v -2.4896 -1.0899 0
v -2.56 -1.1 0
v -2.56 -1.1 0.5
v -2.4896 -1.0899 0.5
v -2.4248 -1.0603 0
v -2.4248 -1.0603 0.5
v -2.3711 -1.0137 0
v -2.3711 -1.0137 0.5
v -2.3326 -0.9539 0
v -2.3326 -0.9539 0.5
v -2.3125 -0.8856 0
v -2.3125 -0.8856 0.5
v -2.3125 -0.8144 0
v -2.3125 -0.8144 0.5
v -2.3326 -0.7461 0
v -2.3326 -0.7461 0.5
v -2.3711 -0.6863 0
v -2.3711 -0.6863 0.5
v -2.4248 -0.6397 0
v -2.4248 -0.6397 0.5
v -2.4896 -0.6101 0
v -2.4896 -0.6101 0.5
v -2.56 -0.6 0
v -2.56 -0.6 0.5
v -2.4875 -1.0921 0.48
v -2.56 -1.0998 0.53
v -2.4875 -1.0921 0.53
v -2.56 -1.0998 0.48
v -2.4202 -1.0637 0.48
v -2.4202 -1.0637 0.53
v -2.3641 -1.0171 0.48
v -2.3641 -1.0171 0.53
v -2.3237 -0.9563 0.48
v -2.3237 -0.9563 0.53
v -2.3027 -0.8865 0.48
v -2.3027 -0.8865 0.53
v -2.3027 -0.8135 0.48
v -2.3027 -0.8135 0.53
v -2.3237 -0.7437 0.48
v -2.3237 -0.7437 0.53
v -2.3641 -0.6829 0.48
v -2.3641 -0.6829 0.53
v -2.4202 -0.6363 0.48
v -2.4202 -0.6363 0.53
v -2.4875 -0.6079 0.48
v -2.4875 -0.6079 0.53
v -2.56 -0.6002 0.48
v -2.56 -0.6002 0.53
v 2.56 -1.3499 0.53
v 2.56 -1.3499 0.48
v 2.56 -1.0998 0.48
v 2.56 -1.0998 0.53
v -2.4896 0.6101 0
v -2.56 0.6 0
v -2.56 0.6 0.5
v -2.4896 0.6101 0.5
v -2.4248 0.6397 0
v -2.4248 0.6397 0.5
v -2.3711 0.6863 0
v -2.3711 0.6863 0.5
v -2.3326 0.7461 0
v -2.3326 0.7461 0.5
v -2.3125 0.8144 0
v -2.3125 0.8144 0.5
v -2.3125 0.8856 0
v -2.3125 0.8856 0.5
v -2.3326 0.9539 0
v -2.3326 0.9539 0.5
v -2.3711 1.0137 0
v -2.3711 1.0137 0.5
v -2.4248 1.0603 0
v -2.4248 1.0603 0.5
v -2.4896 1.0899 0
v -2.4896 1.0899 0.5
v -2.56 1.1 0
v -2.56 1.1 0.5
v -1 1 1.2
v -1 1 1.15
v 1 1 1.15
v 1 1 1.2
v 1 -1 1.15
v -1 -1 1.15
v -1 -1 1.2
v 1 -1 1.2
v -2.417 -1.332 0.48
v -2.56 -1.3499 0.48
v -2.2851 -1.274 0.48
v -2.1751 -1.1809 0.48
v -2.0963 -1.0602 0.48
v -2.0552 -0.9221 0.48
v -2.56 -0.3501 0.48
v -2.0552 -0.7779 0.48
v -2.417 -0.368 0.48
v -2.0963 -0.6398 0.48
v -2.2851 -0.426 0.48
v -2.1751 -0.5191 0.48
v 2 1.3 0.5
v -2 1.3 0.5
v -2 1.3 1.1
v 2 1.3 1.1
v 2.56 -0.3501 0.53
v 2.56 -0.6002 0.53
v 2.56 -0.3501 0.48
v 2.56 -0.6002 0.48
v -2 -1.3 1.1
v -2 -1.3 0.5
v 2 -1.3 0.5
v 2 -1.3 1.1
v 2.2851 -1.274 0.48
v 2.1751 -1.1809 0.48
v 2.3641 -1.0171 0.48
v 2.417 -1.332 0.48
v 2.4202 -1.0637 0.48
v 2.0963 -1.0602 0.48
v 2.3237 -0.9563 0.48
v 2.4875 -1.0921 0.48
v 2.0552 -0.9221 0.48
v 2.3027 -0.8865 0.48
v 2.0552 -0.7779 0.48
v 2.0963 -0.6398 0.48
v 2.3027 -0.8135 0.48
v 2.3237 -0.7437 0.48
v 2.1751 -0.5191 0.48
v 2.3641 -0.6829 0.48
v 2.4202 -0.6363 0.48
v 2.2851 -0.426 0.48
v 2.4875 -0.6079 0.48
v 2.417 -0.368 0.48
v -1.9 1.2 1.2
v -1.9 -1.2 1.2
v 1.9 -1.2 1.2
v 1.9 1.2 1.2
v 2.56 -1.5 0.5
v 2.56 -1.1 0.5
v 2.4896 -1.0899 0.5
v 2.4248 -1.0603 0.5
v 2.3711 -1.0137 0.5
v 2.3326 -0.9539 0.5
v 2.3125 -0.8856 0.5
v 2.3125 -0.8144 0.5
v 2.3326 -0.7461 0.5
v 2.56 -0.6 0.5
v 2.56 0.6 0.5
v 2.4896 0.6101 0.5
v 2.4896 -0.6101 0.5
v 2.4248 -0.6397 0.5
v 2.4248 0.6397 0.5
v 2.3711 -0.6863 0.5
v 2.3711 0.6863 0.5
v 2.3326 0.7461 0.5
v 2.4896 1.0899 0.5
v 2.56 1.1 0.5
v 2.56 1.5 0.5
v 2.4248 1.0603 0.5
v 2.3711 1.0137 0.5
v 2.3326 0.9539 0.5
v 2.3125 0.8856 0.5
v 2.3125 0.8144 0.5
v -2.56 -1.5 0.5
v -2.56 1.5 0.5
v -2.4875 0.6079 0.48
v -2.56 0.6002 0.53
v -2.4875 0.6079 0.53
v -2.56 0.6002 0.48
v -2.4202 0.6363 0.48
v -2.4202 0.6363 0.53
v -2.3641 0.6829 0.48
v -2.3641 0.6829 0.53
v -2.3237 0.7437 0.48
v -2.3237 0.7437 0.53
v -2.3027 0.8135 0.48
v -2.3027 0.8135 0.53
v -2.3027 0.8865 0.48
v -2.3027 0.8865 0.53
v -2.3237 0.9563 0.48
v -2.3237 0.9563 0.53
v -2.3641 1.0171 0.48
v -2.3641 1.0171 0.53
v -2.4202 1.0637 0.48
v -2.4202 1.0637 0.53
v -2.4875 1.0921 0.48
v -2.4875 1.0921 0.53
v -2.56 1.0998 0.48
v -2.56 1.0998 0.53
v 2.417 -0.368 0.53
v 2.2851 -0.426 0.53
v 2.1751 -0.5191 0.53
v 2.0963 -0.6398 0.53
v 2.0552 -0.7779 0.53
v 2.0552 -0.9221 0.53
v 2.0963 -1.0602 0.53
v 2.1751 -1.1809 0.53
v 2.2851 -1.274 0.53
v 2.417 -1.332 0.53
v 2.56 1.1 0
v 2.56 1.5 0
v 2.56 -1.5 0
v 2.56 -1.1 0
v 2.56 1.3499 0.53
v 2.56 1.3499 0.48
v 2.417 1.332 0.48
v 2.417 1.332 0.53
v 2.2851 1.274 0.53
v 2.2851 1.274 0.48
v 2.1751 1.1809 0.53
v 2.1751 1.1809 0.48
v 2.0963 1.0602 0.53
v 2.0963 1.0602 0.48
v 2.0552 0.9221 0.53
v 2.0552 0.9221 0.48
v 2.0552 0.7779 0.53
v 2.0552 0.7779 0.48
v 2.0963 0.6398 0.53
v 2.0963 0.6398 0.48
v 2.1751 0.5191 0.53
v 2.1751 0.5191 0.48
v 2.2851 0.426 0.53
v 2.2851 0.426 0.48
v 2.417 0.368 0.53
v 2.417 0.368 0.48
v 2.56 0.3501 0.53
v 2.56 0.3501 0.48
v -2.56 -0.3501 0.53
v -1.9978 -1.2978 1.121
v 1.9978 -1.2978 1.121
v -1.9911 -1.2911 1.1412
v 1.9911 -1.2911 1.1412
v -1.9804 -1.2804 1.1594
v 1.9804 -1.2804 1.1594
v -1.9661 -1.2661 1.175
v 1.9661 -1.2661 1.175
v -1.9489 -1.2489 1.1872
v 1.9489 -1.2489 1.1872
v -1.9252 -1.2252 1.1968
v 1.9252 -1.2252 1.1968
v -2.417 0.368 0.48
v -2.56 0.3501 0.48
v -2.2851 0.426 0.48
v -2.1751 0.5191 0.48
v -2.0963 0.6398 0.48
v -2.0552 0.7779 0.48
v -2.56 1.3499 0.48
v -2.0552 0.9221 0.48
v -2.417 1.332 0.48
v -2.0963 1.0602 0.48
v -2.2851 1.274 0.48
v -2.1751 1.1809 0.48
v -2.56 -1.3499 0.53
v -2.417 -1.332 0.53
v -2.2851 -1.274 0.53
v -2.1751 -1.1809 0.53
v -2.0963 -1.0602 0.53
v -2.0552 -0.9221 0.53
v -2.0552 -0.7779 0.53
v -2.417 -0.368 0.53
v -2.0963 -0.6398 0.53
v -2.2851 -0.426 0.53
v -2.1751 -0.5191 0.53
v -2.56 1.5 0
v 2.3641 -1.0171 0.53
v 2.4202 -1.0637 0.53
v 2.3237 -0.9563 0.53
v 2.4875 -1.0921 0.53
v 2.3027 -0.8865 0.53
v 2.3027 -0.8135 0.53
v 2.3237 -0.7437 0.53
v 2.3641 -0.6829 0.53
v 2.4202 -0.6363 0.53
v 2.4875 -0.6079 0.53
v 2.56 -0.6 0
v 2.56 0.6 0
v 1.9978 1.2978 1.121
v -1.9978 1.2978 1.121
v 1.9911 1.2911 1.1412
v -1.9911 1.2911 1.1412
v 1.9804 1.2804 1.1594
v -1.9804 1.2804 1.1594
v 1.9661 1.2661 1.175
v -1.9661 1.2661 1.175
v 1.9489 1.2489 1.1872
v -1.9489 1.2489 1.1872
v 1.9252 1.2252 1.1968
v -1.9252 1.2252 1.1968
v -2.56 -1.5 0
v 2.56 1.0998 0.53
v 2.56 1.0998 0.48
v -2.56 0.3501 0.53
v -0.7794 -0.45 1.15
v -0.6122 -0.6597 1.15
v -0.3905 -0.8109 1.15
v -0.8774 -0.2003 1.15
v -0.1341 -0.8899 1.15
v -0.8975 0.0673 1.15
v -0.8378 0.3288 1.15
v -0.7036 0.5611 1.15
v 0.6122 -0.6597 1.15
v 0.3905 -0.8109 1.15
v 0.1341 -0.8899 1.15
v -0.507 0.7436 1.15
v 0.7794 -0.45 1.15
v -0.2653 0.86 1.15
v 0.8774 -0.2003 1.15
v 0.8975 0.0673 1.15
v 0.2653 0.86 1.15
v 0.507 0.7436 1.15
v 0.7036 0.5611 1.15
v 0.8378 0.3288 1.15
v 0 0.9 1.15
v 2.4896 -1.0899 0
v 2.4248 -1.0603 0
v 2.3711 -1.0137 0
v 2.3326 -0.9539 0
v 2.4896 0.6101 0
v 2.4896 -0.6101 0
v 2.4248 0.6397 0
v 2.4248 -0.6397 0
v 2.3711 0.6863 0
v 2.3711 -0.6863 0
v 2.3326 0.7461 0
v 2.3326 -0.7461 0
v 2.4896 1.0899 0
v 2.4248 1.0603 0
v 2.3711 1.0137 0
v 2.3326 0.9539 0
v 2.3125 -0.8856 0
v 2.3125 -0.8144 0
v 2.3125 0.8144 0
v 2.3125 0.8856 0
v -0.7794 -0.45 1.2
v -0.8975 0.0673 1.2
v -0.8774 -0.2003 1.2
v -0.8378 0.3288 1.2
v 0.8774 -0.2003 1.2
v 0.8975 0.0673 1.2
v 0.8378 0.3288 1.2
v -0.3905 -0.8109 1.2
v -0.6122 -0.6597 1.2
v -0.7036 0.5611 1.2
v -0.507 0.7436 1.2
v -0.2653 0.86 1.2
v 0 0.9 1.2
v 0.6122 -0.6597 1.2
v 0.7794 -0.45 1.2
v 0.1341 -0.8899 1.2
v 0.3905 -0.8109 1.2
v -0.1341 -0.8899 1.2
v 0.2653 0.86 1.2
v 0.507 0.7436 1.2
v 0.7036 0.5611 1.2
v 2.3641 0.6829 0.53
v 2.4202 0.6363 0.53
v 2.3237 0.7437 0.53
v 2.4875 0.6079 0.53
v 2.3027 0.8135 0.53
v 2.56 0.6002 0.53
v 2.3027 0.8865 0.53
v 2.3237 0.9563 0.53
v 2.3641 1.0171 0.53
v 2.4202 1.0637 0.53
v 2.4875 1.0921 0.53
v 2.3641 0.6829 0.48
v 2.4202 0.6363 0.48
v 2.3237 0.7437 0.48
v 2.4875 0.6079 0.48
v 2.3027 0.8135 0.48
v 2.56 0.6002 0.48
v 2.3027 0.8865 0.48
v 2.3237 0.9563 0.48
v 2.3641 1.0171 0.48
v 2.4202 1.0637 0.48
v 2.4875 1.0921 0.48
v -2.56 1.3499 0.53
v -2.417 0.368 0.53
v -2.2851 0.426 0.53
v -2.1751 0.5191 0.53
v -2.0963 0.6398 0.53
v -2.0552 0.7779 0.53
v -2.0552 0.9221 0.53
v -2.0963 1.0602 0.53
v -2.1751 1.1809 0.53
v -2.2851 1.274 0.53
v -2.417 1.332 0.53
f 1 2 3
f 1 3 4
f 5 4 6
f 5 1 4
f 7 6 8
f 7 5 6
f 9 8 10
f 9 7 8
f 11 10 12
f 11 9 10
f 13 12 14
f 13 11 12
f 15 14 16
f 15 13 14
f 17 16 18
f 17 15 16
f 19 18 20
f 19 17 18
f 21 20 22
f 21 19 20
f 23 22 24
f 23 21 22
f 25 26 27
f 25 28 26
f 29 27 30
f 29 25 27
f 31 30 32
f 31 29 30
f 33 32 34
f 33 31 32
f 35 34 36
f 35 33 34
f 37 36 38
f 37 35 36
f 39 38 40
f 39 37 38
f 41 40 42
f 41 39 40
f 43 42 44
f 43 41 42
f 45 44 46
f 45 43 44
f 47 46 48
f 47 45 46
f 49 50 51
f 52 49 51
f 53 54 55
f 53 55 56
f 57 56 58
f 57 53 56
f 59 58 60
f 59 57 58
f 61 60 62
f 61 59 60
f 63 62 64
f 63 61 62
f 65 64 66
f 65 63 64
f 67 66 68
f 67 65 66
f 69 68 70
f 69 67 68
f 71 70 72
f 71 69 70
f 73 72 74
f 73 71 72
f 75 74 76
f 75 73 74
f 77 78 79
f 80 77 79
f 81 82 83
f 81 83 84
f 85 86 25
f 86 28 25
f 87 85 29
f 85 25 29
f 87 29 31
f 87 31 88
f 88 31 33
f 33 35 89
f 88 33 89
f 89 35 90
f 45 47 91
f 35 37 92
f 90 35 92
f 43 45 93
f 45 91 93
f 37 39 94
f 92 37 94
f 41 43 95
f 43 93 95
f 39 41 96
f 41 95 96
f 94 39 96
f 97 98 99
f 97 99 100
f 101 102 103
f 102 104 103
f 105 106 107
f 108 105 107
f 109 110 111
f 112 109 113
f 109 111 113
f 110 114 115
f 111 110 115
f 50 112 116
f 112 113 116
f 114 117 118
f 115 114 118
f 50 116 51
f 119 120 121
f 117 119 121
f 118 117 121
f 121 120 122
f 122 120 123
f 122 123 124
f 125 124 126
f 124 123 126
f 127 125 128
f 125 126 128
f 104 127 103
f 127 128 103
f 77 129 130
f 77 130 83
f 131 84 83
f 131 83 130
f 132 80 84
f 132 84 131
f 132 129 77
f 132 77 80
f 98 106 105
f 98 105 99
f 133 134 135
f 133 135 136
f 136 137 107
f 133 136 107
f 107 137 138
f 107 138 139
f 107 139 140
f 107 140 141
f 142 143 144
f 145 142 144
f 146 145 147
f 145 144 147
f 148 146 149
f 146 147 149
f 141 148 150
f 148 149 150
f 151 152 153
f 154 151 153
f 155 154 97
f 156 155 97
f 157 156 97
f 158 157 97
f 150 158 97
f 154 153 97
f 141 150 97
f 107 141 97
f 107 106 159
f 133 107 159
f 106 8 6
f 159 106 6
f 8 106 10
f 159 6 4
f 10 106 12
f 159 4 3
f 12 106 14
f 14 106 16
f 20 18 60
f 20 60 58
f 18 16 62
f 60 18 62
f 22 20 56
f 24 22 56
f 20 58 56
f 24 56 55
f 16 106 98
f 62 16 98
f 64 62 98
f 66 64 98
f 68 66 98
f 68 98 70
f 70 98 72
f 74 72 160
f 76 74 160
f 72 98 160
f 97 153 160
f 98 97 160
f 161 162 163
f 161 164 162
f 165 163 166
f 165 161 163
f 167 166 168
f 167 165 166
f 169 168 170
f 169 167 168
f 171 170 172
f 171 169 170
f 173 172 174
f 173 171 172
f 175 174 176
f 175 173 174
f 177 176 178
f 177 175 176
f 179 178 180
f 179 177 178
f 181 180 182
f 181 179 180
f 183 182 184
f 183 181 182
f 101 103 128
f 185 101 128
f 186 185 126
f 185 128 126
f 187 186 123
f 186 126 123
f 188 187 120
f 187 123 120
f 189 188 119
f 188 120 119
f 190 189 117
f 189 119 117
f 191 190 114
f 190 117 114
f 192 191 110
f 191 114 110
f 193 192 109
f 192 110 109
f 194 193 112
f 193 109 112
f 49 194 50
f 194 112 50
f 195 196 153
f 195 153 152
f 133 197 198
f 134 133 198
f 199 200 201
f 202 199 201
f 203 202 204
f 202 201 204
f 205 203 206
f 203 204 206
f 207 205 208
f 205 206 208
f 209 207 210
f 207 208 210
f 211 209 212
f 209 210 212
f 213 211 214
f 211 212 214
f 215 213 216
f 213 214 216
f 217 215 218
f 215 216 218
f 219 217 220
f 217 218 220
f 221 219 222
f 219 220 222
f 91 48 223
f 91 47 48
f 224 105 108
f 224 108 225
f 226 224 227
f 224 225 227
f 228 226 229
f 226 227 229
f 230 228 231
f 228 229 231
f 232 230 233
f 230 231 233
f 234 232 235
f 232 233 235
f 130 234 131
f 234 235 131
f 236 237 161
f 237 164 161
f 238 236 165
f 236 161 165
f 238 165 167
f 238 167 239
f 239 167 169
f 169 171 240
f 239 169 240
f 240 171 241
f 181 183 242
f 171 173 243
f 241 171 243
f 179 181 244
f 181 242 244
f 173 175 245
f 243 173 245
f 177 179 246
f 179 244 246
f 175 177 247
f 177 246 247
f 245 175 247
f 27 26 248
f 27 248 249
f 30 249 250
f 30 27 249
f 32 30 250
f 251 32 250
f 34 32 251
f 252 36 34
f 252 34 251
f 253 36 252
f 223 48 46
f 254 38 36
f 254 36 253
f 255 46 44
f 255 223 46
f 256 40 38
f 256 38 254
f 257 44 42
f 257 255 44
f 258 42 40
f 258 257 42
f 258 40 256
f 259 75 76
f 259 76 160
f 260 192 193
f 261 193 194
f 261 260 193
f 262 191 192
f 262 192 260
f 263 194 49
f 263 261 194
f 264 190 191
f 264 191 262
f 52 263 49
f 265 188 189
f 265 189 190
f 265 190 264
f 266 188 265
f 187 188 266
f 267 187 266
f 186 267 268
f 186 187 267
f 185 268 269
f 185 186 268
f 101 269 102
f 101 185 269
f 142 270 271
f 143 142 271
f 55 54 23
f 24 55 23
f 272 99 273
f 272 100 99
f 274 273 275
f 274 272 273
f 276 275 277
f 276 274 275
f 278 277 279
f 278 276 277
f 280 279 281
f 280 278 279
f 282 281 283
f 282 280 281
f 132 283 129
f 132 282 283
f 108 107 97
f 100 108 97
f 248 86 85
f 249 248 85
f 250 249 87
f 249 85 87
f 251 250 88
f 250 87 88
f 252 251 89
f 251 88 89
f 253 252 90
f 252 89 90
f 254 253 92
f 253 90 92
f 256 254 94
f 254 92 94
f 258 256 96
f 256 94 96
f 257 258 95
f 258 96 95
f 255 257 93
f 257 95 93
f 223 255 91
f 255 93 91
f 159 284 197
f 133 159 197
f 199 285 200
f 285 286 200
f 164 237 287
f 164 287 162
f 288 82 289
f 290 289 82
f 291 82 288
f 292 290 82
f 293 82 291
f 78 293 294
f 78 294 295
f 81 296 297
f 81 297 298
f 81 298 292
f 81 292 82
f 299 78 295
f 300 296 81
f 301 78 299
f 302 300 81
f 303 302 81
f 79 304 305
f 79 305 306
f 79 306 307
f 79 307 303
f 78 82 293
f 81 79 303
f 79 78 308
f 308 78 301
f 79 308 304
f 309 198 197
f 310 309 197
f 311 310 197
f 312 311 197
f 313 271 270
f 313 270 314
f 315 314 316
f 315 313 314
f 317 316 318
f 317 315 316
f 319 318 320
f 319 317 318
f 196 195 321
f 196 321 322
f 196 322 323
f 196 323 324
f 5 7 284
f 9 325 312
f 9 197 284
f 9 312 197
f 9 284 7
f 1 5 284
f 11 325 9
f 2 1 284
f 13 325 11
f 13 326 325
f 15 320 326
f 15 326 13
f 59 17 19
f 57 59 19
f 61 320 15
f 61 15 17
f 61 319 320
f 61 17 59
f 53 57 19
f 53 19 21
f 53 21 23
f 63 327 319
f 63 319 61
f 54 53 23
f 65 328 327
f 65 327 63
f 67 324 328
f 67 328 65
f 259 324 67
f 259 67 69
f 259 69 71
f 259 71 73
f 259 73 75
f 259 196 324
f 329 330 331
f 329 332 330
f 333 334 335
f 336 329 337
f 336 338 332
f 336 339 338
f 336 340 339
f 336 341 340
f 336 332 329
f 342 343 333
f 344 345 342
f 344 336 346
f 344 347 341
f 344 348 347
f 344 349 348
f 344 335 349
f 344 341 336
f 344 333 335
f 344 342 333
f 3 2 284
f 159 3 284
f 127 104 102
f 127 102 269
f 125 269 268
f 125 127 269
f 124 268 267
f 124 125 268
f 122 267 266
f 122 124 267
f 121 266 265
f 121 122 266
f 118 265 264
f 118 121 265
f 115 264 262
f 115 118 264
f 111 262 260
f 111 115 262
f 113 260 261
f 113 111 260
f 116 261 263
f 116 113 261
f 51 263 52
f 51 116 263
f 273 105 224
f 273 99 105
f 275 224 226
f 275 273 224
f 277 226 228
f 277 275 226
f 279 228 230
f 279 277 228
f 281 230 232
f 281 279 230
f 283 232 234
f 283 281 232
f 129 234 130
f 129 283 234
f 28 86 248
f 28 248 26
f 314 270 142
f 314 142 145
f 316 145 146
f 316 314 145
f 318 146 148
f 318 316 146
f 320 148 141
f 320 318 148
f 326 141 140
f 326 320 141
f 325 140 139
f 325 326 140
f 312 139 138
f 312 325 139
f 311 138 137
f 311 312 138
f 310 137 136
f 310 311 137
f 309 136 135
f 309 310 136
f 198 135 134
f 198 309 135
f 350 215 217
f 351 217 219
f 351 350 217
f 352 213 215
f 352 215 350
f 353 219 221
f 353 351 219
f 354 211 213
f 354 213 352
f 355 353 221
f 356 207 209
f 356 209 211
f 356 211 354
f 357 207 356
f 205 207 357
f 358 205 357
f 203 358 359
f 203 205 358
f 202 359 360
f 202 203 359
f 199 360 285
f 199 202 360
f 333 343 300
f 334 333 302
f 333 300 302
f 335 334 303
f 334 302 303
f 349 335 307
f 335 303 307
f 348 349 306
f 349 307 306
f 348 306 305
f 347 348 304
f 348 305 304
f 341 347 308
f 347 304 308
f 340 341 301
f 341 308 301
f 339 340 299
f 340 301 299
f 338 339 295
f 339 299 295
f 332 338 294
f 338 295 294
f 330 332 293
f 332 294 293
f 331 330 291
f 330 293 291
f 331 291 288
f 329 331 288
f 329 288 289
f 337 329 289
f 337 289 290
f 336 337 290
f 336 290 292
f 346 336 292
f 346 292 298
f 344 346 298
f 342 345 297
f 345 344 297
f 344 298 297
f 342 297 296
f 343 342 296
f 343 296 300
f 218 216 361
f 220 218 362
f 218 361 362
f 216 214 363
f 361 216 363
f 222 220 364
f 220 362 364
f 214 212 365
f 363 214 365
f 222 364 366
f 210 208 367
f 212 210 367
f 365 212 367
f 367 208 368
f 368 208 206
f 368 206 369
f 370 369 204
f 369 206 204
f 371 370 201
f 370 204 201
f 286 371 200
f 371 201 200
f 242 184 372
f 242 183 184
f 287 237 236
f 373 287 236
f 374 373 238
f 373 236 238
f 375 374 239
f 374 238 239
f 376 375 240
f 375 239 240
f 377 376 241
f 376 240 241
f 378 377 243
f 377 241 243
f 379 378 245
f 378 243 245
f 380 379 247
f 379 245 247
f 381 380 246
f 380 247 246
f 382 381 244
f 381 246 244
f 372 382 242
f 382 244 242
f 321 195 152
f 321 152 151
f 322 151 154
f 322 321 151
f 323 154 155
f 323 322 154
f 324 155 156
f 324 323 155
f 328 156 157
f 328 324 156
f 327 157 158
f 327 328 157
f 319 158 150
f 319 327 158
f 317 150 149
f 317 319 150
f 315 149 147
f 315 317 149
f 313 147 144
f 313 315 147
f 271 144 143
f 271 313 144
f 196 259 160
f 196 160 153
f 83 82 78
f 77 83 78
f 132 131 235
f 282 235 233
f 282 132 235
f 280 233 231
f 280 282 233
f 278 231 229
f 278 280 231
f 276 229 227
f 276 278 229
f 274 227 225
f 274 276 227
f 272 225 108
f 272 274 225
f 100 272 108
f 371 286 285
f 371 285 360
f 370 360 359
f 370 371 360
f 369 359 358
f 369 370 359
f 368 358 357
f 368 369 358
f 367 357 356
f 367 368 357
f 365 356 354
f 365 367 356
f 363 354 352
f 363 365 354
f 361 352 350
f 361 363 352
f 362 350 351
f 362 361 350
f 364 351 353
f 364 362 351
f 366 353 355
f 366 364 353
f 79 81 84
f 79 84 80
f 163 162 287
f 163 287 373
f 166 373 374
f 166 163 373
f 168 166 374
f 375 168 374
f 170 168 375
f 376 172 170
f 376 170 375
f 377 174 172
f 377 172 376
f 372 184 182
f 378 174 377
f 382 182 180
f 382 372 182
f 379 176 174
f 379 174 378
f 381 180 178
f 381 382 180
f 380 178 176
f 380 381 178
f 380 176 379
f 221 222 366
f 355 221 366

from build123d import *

# Parameters (mm, degrees)
BOX012_W               = 1
BOX012_H               = 1.5
BOX012_DEPTH           = 0.3
CYLINDER007_R          = 0.25
CYLINDER007_DEPTH      = 0.05
CYLINDER004_R          = 0.5
CYLINDER004_DEPTH      = 0.05
BOX011_W               = 1
BOX011_H               = 2.5
BOX011_DEPTH           = 0.3
CYLINDER008_R          = 0.25
CYLINDER008_DEPTH      = 0.05
CYLINDER003_R          = 0.5
CYLINDER003_DEPTH      = 0.05
BOX009_W               = 1
BOX009_H               = 1.5
BOX009_DEPTH           = 0.3
CYLINDER009_R          = 0.25
CYLINDER009_DEPTH      = 0.05
CYLINDER006_R          = 0.5
CYLINDER006_DEPTH      = 0.05
BOX010_W               = 1
BOX010_H               = 1.5
BOX010_DEPTH           = 0.3
CYLINDER010_R          = 0.25
CYLINDER010_DEPTH      = 0.05
CYLINDER005_R          = 0.5
CYLINDER005_DEPTH      = 0.05
BOX005_W               = 2
BOX005_H               = 3
BOX005_DEPTH           = 0.2
BOX005_PLACEMENT_ANGLE = 120
BOX004_W               = 2
BOX004_H               = 3
BOX004_DEPTH           = 0.2
CYLINDER001_R          = 0.9
CYLINDER001_DEPTH      = 0.1
CUT004_PLACEMENT_ANGLE = 120
BOX007_W               = 2
BOX007_H               = 3
BOX007_DEPTH           = 0.2
BOX007_PLACEMENT_ANGLE = 120
BOX006_W               = 2
BOX006_H               = 3
BOX006_DEPTH           = 0.2
CYLINDER002_R          = 0.9
CYLINDER002_DEPTH      = 0.1
CUT006_PLACEMENT_ANGLE = 240
BOX003_W               = 2
BOX003_H               = 3
BOX003_DEPTH           = 0.2
BOX003_PLACEMENT_ANGLE = 120
BOX002_W               = 2
BOX002_H               = 3
BOX002_DEPTH           = 0.2
CYLINDER_R             = 0.9
CYLINDER_DEPTH         = 0.1
BOX008_W               = 2
BOX008_H               = 2
BOX008_DEPTH           = 0.2
PAD_DEPTH              = 0.5
BOX001_W               = 2
BOX001_H               = 2
BOX001_DEPTH           = 0.1
BOX_W                  = 4
BOX_H                  = 2.6
BOX_DEPTH              = 0.7
FILLET_R               = 0.1


with BuildPart() as kub012:
    # Box012 → Box012 (new body)
    with BuildSketch(Plane(origin=(-3.56, 0, 0.4), x_dir=(1, 0, 0), z_dir=(0, 0, 1))):
        with Locations((0.5, 0.75)):
            Rectangle(BOX012_W, BOX012_H)
    extrude(amount=BOX012_DEPTH)


with BuildPart() as cylinder007:
    # Cylinder007 → Cylinder007 (new body)
    with BuildSketch(Plane(origin=(-2.55, 0.85, 0.48), x_dir=(1, 0, 0), z_dir=(0, 0, 1))):
        Circle(CYLINDER007_R)
    extrude(amount=CYLINDER007_DEPTH)


with BuildPart() as cut011:
    # Cylinder004 → Cylinder004 (new body)
    with BuildSketch(Plane(origin=(-2.55, 0.85, 0.48), x_dir=(1, 0, 0), z_dir=(0, 0, 1))):
        Circle(CYLINDER004_R)
    extrude(amount=CYLINDER004_DEPTH)

    # Cut007: cut Cylinder007
    add(cylinder007.part, mode=Mode.SUBTRACT)

    # Cut011: cut Kub012
    add(kub012.part, mode=Mode.SUBTRACT)


with BuildPart() as kub011:
    # Box011 → Box011 (new body)
    with BuildSketch(Plane(origin=(-3.56, -1.5, 0.4), x_dir=(1, 0, 0), z_dir=(0, 0, 1))):
        with Locations((0.5, 1.25)):
            Rectangle(BOX011_W, BOX011_H)
    extrude(amount=BOX011_DEPTH)


with BuildPart() as cylinder008:
    # Cylinder008 → Cylinder008 (new body)
    with BuildSketch(Plane(origin=(-2.55, -0.85, 0.48), x_dir=(1, 0, 0), z_dir=(0, 0, 1))):
        Circle(CYLINDER008_R)
    extrude(amount=CYLINDER008_DEPTH)


with BuildPart() as cut012:
    # Cylinder003 → Cylinder003 (new body)
    with BuildSketch(Plane(origin=(-2.55, -0.85, 0.48), x_dir=(1, 0, 0), z_dir=(0, 0, 1))):
        Circle(CYLINDER003_R)
    extrude(amount=CYLINDER003_DEPTH)

    # Cut008: cut Cylinder008
    add(cylinder008.part, mode=Mode.SUBTRACT)

    # Cut012: cut Kub011
    add(kub011.part, mode=Mode.SUBTRACT)


with BuildPart() as kub009:
    # Box009 → Box009 (new body)
    with BuildSketch(Plane(origin=(2.56, -1.5, 0.4), x_dir=(1, 0, 0), z_dir=(0, 0, 1))):
        with Locations((0.5, 0.75)):
            Rectangle(BOX009_W, BOX009_H)
    extrude(amount=BOX009_DEPTH)


with BuildPart() as cylinder009:
    # Cylinder009 → Cylinder009 (new body)
    with BuildSketch(Plane(origin=(2.55, -0.85, 0.48), x_dir=(1, 0, 0), z_dir=(0, 0, 1))):
        Circle(CYLINDER009_R)
    extrude(amount=CYLINDER009_DEPTH)


with BuildPart() as cut013:
    # Cylinder006 → Cylinder006 (new body)
    with BuildSketch(Plane(origin=(2.55, -0.85, 0.48), x_dir=(1, 0, 0), z_dir=(0, 0, 1))):
        Circle(CYLINDER006_R)
    extrude(amount=CYLINDER006_DEPTH)

    # Cut009: cut Cylinder009
    add(cylinder009.part, mode=Mode.SUBTRACT)

    # Cut013: cut Kub009
    add(kub009.part, mode=Mode.SUBTRACT)


with BuildPart() as kub010:
    # Box010 → Box010 (new body)
    with BuildSketch(Plane(origin=(2.56, 0, 0.4), x_dir=(1, 0, 0), z_dir=(0, 0, 1))):
        with Locations((0.5, 0.75)):
            Rectangle(BOX010_W, BOX010_H)
    extrude(amount=BOX010_DEPTH)


with BuildPart() as cylinder010:
    # Cylinder010 → Cylinder010 (new body)
    with BuildSketch(Plane(origin=(2.55, 0.85, 0.48), x_dir=(1, 0, 0), z_dir=(0, 0, 1))):
        Circle(CYLINDER010_R)
    extrude(amount=CYLINDER010_DEPTH)


with BuildPart() as cut014:
    # Cylinder005 → Cylinder005 (new body)
    with BuildSketch(Plane(origin=(2.55, 0.85, 0.48), x_dir=(1, 0, 0), z_dir=(0, 0, 1))):
        Circle(CYLINDER005_R)
    extrude(amount=CYLINDER005_DEPTH)

    # Cut010: cut Cylinder010
    add(cylinder010.part, mode=Mode.SUBTRACT)

    # Cut014: cut Kub010
    add(kub010.part, mode=Mode.SUBTRACT)


with BuildPart() as kub005:
    # Box005 → Box005 (new body)
    with BuildSketch(Plane.XY):
        with Locations((1, 1.5)):
            Rectangle(BOX005_W, BOX005_H)
    extrude(amount=BOX005_DEPTH)


with BuildPart() as kub005_1:
    # Box005 placement: moved
    add(kub005.part.moved(Location((0, 0, 1.2))).rotate(Axis((0, 0, 1.2), (0, 0, -1)), BOX005_PLACEMENT_ANGLE))


with BuildPart() as kub004:
    # Box004 → Box004 (new body)
    with BuildSketch(Plane(origin=(-2, -1, 1.2), x_dir=(1, 0, 0), z_dir=(0, 0, 1))):
        with Locations((1, 1.5)):
            Rectangle(BOX004_W, BOX004_H)
    extrude(amount=BOX004_DEPTH)


with BuildPart() as cut004:
    # Cylinder001 → Cylinder001 (new body)
    with BuildSketch(Plane.XY.offset(1.2)):
        Circle(CYLINDER001_R)
    extrude(amount=CYLINDER001_DEPTH)

    # Cut003: cut Kub004
    add(kub004.part, mode=Mode.SUBTRACT)

    # Cut004: cut Kub005
    add(kub005_1.part, mode=Mode.SUBTRACT)


with BuildPart() as cut004_1:
    # Cut004 placement: moved
    add(cut004.part.rotate(Axis((0, 0, 0), (0, 0, 1)), CUT004_PLACEMENT_ANGLE))


with BuildPart() as kub007:
    # Box007 → Box007 (new body)
    with BuildSketch(Plane.XY):
        with Locations((1, 1.5)):
            Rectangle(BOX007_W, BOX007_H)
    extrude(amount=BOX007_DEPTH)


with BuildPart() as kub007_1:
    # Box007 placement: moved
    add(kub007.part.moved(Location((0, 0, 1.2))).rotate(Axis((0, 0, 1.2), (0, 0, -1)), BOX007_PLACEMENT_ANGLE))


with BuildPart() as kub006:
    # Box006 → Box006 (new body)
    with BuildSketch(Plane(origin=(-2, -1, 1.2), x_dir=(1, 0, 0), z_dir=(0, 0, 1))):
        with Locations((1, 1.5)):
            Rectangle(BOX006_W, BOX006_H)
    extrude(amount=BOX006_DEPTH)


with BuildPart() as cut006:
    # Cylinder002 → Cylinder002 (new body)
    with BuildSketch(Plane.XY.offset(1.2)):
        Circle(CYLINDER002_R)
    extrude(amount=CYLINDER002_DEPTH)

    # Cut005: cut Kub006
    add(kub006.part, mode=Mode.SUBTRACT)

    # Cut006: cut Kub007
    add(kub007_1.part, mode=Mode.SUBTRACT)


with BuildPart() as cut006_1:
    # Cut006 placement: moved
    add(cut006.part.rotate(Axis((0, 0, 0), (0, 0, 1)), CUT006_PLACEMENT_ANGLE))


with BuildPart() as kub003:
    # Box003 → Box003 (new body)
    with BuildSketch(Plane.XY):
        with Locations((1, 1.5)):
            Rectangle(BOX003_W, BOX003_H)
    extrude(amount=BOX003_DEPTH)


with BuildPart() as kub003_1:
    # Box003 placement: moved
    add(kub003.part.moved(Location((0, 0, 1.2))).rotate(Axis((0, 0, 1.2), (0, 0, -1)), BOX003_PLACEMENT_ANGLE))


with BuildPart() as kub002:
    # Box002 → Box002 (new body)
    with BuildSketch(Plane(origin=(-2, -1, 1.2), x_dir=(1, 0, 0), z_dir=(0, 0, 1))):
        with Locations((1, 1.5)):
            Rectangle(BOX002_W, BOX002_H)
    extrude(amount=BOX002_DEPTH)


with BuildPart() as colour:
    # Cylinder → Cylinder (new body)
    with BuildSketch(Plane.XY.offset(1.2)):
        Circle(CYLINDER_R)
    extrude(amount=CYLINDER_DEPTH)

    # Cut001: cut Kub002
    add(kub002.part, mode=Mode.SUBTRACT)

    # Cut002: cut Kub003
    add(kub003_1.part, mode=Mode.SUBTRACT)

    # Fusion: union Cut004, Cut006
    add(cut004_1.part)
    add(cut006_1.part)


with BuildPart() as colour_1:
    # Fusion placement: moved
    add(colour.part.moved(Location((0, 0, -0.1))))


with BuildPart() as kub008:
    # Box008 → Box008 (new body)
    with BuildSketch(Plane(origin=(-1, -1, 0.95), x_dir=(1, 0, 0), z_dir=(0, 0, 1))):
        with Locations((1, 1)):
            Rectangle(BOX008_W, BOX008_H)
    extrude(amount=BOX008_DEPTH)


with BuildPart() as body:
    # Sketch → Pad (new body)
    with BuildSketch(Plane.XY):
        with BuildLine():
            Line((-2.56, 1.1), (-2.56, 1.5))
            Line((-2.56, 1.5), (2.56, 1.5))
            Line((2.56, 1.5), (2.56, 1.1))
            ThreePointArc((2.56, 1.1), (2.31, 0.85), (2.56, 0.6))
            Line((2.56, 0.4), (2.56, 0.6))
            Line((2.56, 0.4), (2.56, -0.4))
            Line((2.56, -0.4), (2.56, -0.6))
            ThreePointArc((2.56, -0.6), (2.31, -0.85), (2.56, -1.1))
            Line((2.56, -1.5), (2.56, -1.1))
            Line((-2.56, -1.5), (2.56, -1.5))
            Line((-2.56, -1.1), (-2.56, -1.5))
            ThreePointArc((-2.56, -1.1), (-2.31, -0.85), (-2.56, -0.6))
            Line((-2.56, -0.4), (-2.56, -0.6))
            Line((-2.56, 0.4), (-2.56, -0.4))
            Line((-2.56, 0.4), (-2.56, 0.6))
            ThreePointArc((-2.56, 0.6), (-2.31, 0.85), (-2.56, 1.1))
        make_face()
    extrude(amount=PAD_DEPTH)


with BuildPart() as kub001:
    # Box001 → Box001 (new body)
    with BuildSketch(Plane(origin=(-1, -1, 1.1), x_dir=(1, 0, 0), z_dir=(0, 0, 1))):
        with Locations((1, 1)):
            Rectangle(BOX001_W, BOX001_H)
    extrude(amount=BOX001_DEPTH)


with BuildPart() as fusion001:
    # Box → Box (new body)
    with BuildSketch(Plane(origin=(-2, -1.3, 0.5), x_dir=(1, 0, 0), z_dir=(0, 0, 1))):
        with Locations((2, 1.3)):
            Rectangle(BOX_W, BOX_H)
    extrude(amount=BOX_DEPTH)

    # Cut: cut Kub001
    add(kub001.part, mode=Mode.SUBTRACT)

    # Fillet
    fillet_edges = [fusion001.edges().sort_by_distance(p)[0] for p in [
        (-2, 0, 1.2),
        (0, -1.3, 1.2),
        (0, 1.3, 1.2),
        (2, 0, 1.2),
    ]]
    fillet(fillet_edges, radius=FILLET_R)

    # Fusion001: union Colour, Kub008, Body
    add(colour_1.part)
    add(kub008.part)
    add(body.part)


solid = Compound([cut011.part, cut012.part, cut013.part, cut014.part, fusion001.part])
